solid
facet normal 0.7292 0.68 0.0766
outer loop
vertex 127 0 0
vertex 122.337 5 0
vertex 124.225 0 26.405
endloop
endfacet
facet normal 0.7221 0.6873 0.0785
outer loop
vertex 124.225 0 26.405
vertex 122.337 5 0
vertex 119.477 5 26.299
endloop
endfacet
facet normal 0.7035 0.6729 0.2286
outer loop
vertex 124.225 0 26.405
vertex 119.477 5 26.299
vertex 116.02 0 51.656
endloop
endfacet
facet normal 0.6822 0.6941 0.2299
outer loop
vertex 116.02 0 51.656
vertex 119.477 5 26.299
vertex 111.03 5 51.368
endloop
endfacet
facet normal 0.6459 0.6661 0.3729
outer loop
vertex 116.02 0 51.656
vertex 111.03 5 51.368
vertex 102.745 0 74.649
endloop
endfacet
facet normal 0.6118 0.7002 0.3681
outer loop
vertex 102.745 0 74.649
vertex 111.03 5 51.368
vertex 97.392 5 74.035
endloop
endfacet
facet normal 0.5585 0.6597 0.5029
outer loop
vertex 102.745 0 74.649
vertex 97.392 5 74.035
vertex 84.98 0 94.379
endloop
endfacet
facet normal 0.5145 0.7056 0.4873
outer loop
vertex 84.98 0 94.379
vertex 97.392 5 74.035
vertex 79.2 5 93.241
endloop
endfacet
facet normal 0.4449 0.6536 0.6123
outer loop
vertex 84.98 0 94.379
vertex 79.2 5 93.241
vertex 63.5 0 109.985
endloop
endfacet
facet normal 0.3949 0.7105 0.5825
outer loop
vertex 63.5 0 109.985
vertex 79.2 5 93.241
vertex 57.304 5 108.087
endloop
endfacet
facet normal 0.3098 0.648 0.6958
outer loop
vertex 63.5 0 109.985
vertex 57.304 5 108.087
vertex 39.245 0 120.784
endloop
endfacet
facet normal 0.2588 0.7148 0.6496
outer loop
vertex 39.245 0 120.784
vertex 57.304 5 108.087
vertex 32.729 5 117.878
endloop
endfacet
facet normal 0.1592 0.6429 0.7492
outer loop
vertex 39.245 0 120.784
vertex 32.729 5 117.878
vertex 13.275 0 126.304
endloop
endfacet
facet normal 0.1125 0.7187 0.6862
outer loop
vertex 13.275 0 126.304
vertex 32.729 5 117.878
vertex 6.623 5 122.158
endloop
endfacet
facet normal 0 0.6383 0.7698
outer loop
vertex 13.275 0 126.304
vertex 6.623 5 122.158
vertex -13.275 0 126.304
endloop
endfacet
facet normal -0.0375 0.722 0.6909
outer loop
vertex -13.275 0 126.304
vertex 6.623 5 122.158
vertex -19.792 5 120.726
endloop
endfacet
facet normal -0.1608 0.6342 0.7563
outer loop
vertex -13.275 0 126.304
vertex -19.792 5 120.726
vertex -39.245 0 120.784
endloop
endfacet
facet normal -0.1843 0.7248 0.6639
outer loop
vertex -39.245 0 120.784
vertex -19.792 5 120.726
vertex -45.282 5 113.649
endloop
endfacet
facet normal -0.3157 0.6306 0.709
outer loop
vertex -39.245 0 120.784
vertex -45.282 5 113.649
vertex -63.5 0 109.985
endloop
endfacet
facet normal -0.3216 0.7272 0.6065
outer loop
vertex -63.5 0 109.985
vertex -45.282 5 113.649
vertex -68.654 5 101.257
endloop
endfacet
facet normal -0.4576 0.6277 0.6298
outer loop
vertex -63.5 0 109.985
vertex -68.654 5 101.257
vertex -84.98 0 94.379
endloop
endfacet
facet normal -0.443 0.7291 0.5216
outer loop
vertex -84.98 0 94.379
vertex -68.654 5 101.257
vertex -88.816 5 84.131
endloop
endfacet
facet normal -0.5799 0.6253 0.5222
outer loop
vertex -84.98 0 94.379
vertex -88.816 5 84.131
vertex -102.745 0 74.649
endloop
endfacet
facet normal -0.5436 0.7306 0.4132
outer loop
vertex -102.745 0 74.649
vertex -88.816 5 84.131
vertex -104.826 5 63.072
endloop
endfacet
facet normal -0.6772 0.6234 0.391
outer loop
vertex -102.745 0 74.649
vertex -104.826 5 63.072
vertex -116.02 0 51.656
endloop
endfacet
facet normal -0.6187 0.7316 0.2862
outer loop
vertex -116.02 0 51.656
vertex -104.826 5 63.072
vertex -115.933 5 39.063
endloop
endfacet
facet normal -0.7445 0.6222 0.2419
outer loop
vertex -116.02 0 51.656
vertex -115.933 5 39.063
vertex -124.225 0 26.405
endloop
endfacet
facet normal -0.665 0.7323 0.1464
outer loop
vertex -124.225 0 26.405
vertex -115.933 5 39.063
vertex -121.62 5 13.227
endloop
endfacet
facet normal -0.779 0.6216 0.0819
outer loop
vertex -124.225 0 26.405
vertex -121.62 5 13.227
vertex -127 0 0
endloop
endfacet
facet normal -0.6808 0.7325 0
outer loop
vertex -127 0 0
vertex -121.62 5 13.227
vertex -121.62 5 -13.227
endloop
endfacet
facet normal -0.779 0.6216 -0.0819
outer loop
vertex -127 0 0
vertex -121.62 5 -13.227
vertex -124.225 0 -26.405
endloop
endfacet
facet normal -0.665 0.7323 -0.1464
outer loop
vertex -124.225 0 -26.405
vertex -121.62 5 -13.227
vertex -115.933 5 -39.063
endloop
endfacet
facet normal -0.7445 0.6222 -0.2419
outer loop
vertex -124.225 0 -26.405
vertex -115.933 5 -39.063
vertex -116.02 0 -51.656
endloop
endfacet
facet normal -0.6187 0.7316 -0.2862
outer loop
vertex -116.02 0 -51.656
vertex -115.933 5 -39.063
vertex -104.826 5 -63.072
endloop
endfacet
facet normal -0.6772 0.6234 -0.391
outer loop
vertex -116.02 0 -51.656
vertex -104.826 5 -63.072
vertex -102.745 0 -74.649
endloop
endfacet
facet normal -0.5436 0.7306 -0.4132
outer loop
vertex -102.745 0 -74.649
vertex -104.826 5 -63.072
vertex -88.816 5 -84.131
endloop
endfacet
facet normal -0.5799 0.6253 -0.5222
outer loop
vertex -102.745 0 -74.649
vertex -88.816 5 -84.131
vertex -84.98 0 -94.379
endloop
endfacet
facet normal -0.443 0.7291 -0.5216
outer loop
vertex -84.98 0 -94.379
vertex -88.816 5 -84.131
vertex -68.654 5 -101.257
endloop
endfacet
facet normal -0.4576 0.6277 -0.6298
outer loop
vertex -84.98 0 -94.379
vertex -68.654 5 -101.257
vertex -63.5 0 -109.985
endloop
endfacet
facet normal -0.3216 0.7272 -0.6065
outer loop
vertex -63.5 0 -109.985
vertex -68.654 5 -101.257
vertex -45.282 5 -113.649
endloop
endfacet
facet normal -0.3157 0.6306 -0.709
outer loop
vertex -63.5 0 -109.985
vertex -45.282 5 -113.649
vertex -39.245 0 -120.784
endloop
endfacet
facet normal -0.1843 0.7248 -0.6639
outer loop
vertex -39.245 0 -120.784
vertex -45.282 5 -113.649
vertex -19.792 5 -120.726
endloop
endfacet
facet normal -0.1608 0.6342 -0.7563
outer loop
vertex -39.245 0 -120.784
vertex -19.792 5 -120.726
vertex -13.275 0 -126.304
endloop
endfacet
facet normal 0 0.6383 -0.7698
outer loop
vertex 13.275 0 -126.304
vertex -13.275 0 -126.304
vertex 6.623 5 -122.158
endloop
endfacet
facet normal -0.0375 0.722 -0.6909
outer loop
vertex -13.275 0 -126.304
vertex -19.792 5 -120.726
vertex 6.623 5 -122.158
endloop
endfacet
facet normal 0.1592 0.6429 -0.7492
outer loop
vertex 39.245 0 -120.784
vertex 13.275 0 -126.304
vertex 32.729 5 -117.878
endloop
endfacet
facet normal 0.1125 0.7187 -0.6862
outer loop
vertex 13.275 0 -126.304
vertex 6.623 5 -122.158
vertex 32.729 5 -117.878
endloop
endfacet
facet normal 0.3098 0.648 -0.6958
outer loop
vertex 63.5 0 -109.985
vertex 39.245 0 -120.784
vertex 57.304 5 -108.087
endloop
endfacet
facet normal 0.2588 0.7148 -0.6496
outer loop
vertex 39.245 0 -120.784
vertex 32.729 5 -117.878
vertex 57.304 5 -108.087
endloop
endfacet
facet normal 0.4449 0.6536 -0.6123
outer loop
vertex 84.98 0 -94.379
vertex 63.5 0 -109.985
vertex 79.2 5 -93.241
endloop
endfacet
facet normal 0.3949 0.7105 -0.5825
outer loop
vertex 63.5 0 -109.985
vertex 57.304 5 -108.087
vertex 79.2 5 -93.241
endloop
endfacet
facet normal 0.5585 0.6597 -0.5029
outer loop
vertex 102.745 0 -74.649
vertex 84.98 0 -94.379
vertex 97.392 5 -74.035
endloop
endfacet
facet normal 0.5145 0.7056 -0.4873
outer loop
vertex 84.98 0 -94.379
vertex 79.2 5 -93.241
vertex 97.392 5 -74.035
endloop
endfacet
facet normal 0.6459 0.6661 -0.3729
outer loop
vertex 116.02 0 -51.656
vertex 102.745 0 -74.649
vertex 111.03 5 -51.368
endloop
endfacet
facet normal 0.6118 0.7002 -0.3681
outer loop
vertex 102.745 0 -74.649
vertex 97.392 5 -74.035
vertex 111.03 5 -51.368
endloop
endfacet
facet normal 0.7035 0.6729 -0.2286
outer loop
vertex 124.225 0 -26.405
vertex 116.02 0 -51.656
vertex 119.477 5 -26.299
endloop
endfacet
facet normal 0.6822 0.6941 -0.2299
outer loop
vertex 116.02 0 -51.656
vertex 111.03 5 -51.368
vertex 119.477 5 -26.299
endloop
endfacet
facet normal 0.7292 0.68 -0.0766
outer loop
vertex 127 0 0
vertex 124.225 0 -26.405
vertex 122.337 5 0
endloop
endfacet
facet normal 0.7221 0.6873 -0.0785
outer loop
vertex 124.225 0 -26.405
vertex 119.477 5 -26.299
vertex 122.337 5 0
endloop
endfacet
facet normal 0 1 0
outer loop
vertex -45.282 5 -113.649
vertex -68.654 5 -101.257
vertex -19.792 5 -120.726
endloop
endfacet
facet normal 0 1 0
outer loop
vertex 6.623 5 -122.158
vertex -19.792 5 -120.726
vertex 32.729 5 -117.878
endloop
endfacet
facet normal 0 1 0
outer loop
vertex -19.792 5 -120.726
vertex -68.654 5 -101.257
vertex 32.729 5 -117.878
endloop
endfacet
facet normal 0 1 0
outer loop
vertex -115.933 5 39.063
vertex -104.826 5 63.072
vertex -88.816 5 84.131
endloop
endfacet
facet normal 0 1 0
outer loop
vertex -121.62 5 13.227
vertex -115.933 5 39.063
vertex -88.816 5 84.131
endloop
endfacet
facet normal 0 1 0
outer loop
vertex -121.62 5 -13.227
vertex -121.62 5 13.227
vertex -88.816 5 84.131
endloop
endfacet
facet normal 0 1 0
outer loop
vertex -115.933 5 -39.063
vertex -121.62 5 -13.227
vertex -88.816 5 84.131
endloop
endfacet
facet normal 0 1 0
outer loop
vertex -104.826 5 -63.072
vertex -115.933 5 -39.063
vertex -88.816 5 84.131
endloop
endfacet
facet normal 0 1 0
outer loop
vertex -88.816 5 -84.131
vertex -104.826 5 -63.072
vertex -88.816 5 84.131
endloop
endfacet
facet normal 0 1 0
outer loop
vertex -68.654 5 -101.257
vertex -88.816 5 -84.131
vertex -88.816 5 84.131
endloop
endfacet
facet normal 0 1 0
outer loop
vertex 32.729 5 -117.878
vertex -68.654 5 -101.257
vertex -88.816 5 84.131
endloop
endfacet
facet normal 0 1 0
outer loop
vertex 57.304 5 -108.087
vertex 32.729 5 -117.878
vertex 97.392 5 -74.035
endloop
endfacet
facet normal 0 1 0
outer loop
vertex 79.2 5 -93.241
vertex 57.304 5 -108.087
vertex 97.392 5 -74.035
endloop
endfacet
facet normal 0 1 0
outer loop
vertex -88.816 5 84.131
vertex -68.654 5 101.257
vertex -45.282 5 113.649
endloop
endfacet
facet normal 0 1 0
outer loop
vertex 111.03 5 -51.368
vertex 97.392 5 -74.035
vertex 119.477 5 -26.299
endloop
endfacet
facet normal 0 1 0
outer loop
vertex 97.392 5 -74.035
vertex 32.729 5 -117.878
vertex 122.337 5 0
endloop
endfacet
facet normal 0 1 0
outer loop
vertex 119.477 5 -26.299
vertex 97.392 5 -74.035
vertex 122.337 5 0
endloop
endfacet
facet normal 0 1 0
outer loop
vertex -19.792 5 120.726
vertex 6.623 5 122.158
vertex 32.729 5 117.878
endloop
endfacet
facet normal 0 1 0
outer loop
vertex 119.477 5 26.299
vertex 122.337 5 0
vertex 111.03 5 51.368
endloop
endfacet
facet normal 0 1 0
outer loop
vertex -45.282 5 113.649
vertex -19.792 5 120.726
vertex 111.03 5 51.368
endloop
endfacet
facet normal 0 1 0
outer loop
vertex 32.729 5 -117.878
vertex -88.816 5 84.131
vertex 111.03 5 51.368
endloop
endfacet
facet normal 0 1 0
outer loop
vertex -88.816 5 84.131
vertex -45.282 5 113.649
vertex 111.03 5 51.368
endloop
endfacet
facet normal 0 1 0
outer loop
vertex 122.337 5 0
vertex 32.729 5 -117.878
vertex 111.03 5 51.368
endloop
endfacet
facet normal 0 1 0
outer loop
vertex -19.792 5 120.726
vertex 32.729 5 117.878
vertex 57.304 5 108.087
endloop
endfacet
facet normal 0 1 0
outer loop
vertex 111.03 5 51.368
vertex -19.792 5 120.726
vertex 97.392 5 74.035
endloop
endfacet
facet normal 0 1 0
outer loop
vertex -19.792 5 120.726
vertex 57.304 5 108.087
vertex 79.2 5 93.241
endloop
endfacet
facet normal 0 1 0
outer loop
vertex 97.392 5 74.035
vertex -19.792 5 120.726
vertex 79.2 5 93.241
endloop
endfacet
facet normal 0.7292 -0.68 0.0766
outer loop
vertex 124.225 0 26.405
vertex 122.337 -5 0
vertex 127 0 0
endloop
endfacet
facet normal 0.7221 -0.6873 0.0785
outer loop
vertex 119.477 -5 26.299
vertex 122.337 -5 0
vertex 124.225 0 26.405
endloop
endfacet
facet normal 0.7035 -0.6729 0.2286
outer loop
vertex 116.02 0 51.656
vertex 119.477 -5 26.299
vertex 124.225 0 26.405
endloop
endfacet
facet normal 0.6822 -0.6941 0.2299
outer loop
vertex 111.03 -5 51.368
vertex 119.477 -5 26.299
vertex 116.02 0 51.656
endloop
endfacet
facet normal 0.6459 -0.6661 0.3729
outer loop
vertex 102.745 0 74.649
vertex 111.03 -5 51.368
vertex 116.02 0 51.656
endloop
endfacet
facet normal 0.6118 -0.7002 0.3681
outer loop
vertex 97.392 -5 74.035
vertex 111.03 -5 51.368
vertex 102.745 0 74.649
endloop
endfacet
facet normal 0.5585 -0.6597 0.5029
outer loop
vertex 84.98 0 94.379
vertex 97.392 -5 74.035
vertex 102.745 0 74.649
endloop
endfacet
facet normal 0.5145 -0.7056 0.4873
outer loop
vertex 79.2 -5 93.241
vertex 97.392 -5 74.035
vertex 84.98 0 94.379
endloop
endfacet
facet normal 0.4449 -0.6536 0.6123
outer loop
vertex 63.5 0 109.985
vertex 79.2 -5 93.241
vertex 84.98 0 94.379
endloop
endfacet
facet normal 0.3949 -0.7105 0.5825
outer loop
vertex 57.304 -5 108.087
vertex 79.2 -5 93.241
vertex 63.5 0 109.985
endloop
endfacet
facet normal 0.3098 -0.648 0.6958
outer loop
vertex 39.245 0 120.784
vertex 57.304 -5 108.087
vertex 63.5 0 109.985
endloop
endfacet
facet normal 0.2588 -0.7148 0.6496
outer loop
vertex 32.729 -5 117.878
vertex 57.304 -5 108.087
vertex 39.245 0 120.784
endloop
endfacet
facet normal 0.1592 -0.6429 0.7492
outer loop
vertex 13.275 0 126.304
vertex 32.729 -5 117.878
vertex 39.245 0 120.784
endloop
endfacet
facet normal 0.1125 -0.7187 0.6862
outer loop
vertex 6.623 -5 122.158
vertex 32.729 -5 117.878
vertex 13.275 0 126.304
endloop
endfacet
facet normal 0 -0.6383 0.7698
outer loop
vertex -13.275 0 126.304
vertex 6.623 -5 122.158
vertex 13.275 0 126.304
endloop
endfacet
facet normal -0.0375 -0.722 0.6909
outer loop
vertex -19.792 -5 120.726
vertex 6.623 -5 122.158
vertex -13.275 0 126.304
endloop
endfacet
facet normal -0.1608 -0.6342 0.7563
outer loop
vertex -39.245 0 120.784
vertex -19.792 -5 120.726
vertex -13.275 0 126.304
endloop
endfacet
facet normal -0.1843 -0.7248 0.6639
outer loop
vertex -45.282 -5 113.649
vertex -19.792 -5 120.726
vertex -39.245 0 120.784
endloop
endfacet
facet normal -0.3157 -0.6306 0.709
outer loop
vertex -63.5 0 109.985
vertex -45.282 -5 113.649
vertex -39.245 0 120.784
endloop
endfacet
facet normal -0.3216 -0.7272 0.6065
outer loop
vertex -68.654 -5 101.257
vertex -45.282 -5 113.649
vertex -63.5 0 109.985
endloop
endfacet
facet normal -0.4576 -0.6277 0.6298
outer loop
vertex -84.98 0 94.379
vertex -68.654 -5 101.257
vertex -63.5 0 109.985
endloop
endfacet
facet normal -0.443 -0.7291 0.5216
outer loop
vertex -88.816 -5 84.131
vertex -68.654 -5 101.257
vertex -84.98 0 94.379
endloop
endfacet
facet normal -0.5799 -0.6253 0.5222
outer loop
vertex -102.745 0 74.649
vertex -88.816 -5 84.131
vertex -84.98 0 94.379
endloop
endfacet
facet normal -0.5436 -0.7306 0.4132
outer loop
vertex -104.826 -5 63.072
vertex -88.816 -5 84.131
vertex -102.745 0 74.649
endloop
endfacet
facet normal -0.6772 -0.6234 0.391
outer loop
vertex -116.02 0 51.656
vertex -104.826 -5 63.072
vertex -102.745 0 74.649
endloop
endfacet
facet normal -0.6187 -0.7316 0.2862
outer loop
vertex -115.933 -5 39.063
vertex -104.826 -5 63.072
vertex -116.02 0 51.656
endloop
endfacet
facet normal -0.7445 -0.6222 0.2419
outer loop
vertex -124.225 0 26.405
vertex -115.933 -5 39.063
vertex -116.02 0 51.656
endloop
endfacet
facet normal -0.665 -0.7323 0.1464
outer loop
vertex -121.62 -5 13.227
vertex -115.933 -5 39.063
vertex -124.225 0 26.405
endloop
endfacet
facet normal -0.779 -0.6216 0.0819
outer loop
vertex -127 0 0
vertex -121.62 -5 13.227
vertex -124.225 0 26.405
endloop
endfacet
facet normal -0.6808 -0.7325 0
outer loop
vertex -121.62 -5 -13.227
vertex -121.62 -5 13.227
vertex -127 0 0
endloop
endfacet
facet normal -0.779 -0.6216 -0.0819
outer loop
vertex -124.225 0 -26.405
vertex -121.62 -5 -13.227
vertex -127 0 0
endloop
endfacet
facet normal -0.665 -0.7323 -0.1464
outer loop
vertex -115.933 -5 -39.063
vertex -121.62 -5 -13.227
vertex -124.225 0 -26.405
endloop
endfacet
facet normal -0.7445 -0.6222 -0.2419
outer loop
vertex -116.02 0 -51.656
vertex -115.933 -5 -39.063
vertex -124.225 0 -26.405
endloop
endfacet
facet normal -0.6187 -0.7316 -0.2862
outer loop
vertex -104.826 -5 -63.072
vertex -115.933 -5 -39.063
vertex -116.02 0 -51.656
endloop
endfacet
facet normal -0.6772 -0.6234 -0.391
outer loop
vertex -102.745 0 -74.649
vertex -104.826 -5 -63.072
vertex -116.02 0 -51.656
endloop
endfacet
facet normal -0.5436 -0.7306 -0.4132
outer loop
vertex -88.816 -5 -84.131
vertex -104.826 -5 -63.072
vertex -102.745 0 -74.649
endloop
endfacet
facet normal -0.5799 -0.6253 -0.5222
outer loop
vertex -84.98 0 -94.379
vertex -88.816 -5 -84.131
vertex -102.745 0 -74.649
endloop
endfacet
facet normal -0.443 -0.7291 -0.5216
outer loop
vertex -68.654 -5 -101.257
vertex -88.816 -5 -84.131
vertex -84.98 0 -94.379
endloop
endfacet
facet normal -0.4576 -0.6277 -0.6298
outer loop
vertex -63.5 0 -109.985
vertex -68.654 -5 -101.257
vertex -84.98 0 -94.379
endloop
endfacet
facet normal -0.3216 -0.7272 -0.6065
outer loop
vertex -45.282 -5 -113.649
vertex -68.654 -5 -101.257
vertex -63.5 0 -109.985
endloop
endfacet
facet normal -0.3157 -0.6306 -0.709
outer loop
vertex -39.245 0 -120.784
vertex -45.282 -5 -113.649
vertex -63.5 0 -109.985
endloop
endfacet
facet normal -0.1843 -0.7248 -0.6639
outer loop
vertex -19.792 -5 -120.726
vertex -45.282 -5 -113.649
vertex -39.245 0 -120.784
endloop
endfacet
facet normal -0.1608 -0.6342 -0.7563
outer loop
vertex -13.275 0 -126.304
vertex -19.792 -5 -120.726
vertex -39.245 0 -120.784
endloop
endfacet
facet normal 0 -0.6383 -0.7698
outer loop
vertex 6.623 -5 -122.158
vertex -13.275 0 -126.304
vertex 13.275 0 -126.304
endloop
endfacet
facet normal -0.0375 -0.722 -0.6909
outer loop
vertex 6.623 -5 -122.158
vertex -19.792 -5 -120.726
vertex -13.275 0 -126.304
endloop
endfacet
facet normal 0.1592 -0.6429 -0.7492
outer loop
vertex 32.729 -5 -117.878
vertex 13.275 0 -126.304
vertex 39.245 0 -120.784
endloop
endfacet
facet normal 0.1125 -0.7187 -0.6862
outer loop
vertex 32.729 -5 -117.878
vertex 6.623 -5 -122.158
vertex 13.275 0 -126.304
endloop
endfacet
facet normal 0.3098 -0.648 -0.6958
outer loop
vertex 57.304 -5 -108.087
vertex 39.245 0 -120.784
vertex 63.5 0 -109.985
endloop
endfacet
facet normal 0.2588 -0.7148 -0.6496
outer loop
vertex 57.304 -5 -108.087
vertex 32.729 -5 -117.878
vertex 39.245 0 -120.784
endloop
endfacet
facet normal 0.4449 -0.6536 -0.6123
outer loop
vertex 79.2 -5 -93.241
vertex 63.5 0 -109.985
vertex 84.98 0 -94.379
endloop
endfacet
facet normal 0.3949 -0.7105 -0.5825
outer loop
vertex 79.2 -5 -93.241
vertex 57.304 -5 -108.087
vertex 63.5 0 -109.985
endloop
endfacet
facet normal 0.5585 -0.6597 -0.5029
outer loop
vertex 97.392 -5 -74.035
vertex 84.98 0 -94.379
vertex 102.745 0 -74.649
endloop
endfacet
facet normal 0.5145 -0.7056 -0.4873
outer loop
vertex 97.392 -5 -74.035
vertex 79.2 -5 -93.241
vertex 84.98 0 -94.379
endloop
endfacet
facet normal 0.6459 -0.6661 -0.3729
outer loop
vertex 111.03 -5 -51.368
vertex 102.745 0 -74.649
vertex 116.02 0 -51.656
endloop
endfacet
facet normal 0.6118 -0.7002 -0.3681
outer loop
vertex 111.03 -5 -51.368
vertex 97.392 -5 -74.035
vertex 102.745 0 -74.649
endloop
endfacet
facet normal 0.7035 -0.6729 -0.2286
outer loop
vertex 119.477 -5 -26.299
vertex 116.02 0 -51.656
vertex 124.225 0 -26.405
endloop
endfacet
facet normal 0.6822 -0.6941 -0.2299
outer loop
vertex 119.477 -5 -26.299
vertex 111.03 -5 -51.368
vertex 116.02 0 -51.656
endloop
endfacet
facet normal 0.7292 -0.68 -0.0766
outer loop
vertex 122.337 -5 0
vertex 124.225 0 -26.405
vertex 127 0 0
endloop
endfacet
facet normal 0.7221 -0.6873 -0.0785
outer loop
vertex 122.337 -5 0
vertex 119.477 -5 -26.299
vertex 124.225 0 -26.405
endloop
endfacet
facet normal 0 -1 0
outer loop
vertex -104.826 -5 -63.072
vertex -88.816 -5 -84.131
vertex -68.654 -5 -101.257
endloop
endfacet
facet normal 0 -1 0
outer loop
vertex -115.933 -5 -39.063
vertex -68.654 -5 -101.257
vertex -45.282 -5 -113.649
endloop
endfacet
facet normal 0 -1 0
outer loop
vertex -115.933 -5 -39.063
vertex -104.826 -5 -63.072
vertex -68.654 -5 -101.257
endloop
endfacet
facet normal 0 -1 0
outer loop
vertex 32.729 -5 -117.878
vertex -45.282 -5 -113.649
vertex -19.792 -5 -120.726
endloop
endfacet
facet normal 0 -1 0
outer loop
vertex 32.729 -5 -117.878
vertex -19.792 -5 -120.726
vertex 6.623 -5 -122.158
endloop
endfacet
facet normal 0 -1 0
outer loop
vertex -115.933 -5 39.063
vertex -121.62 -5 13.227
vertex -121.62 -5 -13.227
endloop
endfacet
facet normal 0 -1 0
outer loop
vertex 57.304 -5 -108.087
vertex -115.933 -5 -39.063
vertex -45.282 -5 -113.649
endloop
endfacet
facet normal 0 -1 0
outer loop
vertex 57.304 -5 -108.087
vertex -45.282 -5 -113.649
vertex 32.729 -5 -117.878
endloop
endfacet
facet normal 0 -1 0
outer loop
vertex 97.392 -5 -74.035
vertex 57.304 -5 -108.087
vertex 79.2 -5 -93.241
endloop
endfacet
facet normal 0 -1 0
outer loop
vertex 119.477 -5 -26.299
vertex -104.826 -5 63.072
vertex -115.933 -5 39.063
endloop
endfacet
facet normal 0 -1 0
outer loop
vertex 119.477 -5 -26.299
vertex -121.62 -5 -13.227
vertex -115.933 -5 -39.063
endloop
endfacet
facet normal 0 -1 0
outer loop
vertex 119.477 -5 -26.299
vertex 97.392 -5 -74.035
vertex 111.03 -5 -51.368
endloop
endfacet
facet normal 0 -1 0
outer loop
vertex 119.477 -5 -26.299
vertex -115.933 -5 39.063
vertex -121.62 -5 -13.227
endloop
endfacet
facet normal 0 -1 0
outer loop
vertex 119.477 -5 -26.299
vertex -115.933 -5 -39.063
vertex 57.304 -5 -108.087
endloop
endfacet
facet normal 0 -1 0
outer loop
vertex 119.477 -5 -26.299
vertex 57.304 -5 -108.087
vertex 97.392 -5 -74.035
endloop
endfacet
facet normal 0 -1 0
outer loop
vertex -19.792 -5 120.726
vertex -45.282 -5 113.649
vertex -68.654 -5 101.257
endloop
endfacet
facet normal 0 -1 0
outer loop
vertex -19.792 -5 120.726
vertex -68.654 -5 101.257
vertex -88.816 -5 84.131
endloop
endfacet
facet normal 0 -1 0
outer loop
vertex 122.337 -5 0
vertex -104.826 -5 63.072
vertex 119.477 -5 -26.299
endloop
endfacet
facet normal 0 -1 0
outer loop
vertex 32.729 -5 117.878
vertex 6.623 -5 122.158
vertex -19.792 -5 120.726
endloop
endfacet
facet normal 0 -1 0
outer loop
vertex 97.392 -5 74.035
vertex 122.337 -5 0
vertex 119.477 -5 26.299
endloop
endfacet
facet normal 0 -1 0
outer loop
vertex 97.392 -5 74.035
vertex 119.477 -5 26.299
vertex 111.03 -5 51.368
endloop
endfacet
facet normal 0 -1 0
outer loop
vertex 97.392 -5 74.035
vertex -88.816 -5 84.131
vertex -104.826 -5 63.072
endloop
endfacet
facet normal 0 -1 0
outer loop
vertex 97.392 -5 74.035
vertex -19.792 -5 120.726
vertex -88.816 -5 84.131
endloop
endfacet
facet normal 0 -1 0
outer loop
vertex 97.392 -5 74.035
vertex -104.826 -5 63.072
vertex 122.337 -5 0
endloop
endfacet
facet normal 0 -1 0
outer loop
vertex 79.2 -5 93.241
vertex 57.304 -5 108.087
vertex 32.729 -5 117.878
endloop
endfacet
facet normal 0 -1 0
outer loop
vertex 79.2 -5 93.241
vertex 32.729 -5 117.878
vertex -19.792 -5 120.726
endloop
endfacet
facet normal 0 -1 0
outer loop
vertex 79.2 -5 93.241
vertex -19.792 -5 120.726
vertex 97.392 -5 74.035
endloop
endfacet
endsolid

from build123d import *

# Parameters (mm, degrees)
F0_R     = 127
F0_R_2   = 5
F1_DEPTH = 5
F2_DEPTH = 5
F3_SIZE2 = 4.662565
F3_SIZE  = 4.99999


# Not quite as in the source:
# - a fillet or chamfer is up to 0.001 mm smaller than in the source, because OpenCascade refuses the exact size


with BuildPart() as f1:
    # F0 (on Front) → F1 (new body, symmetric)
    with BuildSketch(Plane.XZ):
        Circle(F0_R)
        Circle(F0_R_2, mode=Mode.SUBTRACT)
    extrude(amount=F1_DEPTH, both=True)

    # F0 (on Front) → F2 (join, symmetric)
    with BuildSketch(Plane.XZ):
        Circle(F0_R_2)
    extrude(amount=F2_DEPTH, both=True)

    # F3 (size 5 and 4.6625754307 in the source; OpenCascade refuses exactly that, so slightly less here)
    f3_edges = [f1.edges().sort_by_distance(p)[0] for p in [
        (-127, 5, 0),
        (-127, -5, 0),
    ]]
    f3_side = f1.faces().sort_by_distance((-127, 0, 0))[0]
    chamfer(f3_edges, length=F3_SIZE, length2=F3_SIZE2, reference=f3_side)


solid = f1.part
